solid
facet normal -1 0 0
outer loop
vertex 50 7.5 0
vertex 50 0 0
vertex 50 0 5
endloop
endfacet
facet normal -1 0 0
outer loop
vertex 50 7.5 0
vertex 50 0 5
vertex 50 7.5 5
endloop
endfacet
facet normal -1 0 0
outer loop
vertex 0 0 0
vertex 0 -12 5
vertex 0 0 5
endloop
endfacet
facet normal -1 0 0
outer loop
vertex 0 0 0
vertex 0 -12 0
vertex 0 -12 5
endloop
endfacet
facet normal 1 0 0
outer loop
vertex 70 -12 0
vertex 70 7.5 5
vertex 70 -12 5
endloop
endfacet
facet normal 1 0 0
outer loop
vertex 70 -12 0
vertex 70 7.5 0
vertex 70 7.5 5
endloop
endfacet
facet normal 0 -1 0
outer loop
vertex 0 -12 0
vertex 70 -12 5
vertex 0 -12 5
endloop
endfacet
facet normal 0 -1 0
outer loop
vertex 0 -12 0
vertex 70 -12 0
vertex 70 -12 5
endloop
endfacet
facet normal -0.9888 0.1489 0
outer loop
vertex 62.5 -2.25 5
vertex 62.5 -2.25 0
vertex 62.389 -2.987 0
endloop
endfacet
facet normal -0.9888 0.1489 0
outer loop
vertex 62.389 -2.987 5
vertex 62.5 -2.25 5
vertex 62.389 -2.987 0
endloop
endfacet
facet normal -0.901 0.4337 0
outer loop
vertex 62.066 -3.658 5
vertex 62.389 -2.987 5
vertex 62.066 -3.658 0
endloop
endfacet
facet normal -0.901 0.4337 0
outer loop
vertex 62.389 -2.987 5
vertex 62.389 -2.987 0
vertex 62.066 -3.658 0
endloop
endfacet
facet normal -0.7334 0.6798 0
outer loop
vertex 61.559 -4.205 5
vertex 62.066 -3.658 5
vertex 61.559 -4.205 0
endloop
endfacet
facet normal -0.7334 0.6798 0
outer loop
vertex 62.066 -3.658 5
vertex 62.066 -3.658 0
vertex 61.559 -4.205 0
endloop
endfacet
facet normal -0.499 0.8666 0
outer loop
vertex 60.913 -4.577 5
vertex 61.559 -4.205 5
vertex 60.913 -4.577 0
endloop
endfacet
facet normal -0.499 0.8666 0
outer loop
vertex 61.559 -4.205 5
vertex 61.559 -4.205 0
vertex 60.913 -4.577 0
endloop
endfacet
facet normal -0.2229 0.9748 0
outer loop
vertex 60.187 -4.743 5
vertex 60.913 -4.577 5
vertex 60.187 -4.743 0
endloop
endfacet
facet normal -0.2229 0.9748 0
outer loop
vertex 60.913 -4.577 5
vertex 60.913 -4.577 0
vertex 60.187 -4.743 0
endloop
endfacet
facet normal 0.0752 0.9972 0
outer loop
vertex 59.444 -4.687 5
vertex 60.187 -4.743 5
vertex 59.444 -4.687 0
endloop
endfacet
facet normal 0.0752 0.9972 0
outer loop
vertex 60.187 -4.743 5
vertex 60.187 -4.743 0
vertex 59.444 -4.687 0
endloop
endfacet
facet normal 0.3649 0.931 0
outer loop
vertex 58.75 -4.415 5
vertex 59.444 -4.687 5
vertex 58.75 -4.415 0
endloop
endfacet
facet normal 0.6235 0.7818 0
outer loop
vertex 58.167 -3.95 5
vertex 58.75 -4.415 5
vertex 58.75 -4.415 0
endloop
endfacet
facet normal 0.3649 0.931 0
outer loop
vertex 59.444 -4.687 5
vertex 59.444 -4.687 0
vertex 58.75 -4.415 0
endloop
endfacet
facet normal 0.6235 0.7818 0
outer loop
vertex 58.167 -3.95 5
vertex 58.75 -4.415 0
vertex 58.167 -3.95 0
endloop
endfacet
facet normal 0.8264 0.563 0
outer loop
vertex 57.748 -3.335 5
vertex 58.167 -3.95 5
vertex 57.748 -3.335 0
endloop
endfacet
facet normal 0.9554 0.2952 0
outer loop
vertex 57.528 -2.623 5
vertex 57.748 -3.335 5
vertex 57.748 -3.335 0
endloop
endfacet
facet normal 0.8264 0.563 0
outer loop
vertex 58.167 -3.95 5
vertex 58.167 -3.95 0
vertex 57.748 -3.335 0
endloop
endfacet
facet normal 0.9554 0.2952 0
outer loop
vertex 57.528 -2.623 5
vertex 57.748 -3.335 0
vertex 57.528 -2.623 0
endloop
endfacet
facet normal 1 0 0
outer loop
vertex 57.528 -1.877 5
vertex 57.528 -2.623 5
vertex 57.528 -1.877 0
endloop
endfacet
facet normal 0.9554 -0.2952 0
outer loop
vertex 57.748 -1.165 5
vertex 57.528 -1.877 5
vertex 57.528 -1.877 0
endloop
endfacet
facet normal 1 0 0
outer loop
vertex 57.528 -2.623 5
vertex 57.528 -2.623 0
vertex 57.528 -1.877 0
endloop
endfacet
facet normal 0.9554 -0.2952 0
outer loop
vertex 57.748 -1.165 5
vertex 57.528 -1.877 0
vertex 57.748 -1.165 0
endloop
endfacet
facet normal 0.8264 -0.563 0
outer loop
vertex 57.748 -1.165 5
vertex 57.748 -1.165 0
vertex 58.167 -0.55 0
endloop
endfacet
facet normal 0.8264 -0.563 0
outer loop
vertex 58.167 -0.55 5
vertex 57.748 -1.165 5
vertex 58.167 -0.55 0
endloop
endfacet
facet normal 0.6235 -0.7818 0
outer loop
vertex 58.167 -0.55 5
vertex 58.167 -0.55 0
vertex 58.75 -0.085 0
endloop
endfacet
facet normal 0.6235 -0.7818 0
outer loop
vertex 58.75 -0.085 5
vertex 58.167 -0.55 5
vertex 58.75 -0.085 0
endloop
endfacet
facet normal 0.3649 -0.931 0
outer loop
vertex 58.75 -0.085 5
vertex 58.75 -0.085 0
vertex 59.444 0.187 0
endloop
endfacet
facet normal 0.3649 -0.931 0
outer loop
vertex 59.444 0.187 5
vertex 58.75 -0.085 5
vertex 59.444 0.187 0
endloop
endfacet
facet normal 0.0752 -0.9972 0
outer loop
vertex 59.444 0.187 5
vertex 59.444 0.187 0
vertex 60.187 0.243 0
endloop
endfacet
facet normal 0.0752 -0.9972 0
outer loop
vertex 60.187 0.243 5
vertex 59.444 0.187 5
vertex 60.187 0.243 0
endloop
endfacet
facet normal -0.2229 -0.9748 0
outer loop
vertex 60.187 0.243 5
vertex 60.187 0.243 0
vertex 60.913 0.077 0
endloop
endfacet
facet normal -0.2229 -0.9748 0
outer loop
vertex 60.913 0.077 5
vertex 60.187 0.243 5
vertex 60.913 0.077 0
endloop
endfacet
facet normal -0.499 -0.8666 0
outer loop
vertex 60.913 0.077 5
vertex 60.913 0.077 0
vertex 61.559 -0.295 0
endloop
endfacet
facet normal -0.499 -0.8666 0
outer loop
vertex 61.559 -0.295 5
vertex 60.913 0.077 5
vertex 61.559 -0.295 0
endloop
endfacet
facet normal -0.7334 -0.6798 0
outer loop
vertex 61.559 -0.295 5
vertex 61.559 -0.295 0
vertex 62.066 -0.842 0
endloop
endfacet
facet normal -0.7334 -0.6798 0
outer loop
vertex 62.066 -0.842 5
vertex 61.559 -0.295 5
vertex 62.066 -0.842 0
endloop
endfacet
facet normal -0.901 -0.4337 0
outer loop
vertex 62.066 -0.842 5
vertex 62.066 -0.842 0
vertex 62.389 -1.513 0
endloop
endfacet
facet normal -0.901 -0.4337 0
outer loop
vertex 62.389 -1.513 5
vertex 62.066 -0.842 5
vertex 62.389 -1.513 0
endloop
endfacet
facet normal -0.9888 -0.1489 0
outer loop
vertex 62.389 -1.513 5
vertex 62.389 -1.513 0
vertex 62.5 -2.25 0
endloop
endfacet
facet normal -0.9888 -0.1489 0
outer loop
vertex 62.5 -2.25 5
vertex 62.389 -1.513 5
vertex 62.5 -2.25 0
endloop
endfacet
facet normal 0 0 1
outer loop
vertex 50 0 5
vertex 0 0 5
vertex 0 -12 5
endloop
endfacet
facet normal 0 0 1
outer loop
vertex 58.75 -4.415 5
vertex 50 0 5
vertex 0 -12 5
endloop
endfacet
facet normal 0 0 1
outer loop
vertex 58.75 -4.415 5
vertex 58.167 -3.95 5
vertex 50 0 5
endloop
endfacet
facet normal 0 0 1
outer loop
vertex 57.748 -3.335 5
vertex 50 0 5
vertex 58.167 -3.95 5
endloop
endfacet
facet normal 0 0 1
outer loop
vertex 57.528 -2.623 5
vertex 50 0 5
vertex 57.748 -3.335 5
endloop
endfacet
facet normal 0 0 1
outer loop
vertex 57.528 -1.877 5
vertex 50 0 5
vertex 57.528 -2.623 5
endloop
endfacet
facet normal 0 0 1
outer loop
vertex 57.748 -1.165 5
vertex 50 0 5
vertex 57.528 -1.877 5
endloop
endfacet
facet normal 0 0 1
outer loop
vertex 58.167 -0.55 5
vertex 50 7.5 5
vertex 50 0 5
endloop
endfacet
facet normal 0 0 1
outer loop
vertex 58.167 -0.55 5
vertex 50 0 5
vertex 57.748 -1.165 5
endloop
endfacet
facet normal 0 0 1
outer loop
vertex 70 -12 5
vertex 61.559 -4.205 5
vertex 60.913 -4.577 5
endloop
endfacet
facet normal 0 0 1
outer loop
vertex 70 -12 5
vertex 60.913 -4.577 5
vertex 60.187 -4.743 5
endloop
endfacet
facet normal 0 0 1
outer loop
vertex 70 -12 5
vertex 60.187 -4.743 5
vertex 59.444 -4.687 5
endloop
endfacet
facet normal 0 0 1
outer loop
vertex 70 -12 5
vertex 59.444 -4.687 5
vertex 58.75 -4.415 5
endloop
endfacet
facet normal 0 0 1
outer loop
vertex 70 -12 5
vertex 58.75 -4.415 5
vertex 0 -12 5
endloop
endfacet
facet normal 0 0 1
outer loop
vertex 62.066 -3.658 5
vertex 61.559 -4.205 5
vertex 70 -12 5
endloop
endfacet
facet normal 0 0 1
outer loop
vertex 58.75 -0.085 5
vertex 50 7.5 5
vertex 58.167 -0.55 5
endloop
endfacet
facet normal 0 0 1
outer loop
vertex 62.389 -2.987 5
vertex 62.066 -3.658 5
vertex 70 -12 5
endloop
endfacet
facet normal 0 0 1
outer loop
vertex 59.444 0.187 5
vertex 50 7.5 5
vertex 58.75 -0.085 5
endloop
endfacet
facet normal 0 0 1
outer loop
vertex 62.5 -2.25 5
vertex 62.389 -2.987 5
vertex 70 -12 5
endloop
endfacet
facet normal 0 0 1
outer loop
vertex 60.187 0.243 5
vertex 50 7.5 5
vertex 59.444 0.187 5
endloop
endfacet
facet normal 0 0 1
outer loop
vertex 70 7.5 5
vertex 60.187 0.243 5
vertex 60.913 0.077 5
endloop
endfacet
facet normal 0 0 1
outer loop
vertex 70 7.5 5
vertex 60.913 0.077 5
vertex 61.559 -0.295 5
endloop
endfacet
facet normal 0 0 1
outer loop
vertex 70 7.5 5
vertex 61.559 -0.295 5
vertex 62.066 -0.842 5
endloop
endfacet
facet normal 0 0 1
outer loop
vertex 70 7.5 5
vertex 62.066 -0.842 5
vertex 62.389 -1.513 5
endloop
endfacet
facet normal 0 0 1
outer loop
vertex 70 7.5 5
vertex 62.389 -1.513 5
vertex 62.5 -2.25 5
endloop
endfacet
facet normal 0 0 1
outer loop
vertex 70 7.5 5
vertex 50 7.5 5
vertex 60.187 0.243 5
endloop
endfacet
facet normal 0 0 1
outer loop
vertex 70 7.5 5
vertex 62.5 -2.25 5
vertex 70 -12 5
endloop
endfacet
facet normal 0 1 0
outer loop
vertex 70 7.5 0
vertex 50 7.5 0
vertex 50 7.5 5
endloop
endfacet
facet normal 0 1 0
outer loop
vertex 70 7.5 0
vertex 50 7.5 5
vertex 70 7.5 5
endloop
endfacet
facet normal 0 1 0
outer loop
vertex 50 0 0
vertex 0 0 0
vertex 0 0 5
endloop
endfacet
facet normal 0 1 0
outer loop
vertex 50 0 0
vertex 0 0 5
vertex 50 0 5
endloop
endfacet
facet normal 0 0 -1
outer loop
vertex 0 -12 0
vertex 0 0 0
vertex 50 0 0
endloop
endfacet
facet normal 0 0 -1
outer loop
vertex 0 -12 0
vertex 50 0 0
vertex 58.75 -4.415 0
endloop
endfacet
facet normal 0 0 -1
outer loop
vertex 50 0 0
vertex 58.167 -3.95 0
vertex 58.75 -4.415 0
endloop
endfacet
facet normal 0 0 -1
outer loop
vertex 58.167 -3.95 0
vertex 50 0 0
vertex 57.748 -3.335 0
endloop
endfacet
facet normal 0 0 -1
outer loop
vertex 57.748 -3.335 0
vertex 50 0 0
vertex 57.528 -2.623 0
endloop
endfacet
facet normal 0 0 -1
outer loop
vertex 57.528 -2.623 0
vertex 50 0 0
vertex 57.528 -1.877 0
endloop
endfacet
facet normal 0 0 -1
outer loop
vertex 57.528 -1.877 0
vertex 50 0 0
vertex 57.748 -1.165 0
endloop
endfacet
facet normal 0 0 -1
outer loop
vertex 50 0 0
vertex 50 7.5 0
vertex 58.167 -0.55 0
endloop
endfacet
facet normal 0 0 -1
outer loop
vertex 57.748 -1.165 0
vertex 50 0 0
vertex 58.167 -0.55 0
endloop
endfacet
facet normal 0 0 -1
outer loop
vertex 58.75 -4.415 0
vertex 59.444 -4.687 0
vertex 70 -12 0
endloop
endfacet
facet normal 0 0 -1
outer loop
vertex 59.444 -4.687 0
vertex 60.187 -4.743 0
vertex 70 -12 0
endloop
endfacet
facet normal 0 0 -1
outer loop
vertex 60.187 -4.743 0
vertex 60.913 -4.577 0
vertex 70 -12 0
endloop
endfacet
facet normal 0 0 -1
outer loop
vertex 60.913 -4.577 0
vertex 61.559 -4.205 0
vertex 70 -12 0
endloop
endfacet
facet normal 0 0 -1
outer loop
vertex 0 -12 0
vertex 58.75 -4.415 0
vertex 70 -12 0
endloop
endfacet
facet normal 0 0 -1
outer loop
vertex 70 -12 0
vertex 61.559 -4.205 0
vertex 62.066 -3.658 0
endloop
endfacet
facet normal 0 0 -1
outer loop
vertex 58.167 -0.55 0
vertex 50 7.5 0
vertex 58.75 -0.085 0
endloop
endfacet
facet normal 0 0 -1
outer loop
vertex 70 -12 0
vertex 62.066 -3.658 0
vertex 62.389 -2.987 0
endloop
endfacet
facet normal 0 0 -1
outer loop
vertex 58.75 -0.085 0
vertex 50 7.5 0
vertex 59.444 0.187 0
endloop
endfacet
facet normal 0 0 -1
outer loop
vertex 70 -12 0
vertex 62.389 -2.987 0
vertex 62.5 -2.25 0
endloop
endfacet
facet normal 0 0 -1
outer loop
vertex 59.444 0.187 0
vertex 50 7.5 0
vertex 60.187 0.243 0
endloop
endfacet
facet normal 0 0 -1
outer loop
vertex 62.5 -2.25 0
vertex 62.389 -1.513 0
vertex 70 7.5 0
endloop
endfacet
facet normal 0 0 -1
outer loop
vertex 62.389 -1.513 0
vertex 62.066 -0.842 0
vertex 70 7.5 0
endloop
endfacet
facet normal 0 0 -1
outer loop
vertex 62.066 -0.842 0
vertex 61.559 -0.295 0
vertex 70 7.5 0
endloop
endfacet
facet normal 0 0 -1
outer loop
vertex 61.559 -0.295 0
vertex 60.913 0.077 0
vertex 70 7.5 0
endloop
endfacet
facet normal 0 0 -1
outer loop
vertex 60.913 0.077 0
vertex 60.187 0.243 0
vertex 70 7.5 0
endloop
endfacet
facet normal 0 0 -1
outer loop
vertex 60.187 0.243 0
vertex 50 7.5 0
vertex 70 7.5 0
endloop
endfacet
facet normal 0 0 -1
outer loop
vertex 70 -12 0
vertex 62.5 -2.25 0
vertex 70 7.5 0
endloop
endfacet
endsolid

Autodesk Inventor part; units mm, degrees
ref_plane "YZ Plane" through (0, 0, 0) normal (1, 0, 0) x (0, 1, 0)
ref_plane "XZ Plane" through (0, 0, 0) normal (0, 1, 0) x (-1, 0, 0)
ref_plane "XY Plane" through (0, 0, 0) normal (0, 0, 1) x (1, 0, 0)
sketch "Sketch1" plane through (0, 0, 0) normal (0, 0, 1) x (1, 0, 0)
  line L0 (0, 0) -> (70, 0)
  line L1 (70, 0) -> (70, -12)
  line L2 (70, -12) -> (0, -12)
  line L3 (0, -12) -> (0, 0)
  line L4 (70, 0) -> (50, 0)
  line L5 (50, 0) -> (50, 7.5)
  line L6 (50, 7.5) -> (70, 7.5)
  line L7 (70, 7.5) -> (70, 0)
  circle A0 centre (60, -2.25) radius 2.5
  point P0 (0, -6)
  point P1 (70, -6)
  point P2 (35, 0)
  point P3 (50, 0)
  dimension "d0" = 70
  dimension "d1" = 12
  dimension "d11" = 20
  dimension "d12" = 7.5
  dimension "d15" = 9.75
  dimension "d16" = 10
  dimension "d17" = 5
extrude "Extrusion2" add sketch "Sketch1" along normal blind 5 contours L0 A0 L1 L2 L3 | L5 L6 L7 L0 A0
equation "\"d15\" = 0.5 * d1 + 0.5 * d12"
equation "\"d16\" = 0.5 * d11"
properties part number "Touchscreen mount v03"
